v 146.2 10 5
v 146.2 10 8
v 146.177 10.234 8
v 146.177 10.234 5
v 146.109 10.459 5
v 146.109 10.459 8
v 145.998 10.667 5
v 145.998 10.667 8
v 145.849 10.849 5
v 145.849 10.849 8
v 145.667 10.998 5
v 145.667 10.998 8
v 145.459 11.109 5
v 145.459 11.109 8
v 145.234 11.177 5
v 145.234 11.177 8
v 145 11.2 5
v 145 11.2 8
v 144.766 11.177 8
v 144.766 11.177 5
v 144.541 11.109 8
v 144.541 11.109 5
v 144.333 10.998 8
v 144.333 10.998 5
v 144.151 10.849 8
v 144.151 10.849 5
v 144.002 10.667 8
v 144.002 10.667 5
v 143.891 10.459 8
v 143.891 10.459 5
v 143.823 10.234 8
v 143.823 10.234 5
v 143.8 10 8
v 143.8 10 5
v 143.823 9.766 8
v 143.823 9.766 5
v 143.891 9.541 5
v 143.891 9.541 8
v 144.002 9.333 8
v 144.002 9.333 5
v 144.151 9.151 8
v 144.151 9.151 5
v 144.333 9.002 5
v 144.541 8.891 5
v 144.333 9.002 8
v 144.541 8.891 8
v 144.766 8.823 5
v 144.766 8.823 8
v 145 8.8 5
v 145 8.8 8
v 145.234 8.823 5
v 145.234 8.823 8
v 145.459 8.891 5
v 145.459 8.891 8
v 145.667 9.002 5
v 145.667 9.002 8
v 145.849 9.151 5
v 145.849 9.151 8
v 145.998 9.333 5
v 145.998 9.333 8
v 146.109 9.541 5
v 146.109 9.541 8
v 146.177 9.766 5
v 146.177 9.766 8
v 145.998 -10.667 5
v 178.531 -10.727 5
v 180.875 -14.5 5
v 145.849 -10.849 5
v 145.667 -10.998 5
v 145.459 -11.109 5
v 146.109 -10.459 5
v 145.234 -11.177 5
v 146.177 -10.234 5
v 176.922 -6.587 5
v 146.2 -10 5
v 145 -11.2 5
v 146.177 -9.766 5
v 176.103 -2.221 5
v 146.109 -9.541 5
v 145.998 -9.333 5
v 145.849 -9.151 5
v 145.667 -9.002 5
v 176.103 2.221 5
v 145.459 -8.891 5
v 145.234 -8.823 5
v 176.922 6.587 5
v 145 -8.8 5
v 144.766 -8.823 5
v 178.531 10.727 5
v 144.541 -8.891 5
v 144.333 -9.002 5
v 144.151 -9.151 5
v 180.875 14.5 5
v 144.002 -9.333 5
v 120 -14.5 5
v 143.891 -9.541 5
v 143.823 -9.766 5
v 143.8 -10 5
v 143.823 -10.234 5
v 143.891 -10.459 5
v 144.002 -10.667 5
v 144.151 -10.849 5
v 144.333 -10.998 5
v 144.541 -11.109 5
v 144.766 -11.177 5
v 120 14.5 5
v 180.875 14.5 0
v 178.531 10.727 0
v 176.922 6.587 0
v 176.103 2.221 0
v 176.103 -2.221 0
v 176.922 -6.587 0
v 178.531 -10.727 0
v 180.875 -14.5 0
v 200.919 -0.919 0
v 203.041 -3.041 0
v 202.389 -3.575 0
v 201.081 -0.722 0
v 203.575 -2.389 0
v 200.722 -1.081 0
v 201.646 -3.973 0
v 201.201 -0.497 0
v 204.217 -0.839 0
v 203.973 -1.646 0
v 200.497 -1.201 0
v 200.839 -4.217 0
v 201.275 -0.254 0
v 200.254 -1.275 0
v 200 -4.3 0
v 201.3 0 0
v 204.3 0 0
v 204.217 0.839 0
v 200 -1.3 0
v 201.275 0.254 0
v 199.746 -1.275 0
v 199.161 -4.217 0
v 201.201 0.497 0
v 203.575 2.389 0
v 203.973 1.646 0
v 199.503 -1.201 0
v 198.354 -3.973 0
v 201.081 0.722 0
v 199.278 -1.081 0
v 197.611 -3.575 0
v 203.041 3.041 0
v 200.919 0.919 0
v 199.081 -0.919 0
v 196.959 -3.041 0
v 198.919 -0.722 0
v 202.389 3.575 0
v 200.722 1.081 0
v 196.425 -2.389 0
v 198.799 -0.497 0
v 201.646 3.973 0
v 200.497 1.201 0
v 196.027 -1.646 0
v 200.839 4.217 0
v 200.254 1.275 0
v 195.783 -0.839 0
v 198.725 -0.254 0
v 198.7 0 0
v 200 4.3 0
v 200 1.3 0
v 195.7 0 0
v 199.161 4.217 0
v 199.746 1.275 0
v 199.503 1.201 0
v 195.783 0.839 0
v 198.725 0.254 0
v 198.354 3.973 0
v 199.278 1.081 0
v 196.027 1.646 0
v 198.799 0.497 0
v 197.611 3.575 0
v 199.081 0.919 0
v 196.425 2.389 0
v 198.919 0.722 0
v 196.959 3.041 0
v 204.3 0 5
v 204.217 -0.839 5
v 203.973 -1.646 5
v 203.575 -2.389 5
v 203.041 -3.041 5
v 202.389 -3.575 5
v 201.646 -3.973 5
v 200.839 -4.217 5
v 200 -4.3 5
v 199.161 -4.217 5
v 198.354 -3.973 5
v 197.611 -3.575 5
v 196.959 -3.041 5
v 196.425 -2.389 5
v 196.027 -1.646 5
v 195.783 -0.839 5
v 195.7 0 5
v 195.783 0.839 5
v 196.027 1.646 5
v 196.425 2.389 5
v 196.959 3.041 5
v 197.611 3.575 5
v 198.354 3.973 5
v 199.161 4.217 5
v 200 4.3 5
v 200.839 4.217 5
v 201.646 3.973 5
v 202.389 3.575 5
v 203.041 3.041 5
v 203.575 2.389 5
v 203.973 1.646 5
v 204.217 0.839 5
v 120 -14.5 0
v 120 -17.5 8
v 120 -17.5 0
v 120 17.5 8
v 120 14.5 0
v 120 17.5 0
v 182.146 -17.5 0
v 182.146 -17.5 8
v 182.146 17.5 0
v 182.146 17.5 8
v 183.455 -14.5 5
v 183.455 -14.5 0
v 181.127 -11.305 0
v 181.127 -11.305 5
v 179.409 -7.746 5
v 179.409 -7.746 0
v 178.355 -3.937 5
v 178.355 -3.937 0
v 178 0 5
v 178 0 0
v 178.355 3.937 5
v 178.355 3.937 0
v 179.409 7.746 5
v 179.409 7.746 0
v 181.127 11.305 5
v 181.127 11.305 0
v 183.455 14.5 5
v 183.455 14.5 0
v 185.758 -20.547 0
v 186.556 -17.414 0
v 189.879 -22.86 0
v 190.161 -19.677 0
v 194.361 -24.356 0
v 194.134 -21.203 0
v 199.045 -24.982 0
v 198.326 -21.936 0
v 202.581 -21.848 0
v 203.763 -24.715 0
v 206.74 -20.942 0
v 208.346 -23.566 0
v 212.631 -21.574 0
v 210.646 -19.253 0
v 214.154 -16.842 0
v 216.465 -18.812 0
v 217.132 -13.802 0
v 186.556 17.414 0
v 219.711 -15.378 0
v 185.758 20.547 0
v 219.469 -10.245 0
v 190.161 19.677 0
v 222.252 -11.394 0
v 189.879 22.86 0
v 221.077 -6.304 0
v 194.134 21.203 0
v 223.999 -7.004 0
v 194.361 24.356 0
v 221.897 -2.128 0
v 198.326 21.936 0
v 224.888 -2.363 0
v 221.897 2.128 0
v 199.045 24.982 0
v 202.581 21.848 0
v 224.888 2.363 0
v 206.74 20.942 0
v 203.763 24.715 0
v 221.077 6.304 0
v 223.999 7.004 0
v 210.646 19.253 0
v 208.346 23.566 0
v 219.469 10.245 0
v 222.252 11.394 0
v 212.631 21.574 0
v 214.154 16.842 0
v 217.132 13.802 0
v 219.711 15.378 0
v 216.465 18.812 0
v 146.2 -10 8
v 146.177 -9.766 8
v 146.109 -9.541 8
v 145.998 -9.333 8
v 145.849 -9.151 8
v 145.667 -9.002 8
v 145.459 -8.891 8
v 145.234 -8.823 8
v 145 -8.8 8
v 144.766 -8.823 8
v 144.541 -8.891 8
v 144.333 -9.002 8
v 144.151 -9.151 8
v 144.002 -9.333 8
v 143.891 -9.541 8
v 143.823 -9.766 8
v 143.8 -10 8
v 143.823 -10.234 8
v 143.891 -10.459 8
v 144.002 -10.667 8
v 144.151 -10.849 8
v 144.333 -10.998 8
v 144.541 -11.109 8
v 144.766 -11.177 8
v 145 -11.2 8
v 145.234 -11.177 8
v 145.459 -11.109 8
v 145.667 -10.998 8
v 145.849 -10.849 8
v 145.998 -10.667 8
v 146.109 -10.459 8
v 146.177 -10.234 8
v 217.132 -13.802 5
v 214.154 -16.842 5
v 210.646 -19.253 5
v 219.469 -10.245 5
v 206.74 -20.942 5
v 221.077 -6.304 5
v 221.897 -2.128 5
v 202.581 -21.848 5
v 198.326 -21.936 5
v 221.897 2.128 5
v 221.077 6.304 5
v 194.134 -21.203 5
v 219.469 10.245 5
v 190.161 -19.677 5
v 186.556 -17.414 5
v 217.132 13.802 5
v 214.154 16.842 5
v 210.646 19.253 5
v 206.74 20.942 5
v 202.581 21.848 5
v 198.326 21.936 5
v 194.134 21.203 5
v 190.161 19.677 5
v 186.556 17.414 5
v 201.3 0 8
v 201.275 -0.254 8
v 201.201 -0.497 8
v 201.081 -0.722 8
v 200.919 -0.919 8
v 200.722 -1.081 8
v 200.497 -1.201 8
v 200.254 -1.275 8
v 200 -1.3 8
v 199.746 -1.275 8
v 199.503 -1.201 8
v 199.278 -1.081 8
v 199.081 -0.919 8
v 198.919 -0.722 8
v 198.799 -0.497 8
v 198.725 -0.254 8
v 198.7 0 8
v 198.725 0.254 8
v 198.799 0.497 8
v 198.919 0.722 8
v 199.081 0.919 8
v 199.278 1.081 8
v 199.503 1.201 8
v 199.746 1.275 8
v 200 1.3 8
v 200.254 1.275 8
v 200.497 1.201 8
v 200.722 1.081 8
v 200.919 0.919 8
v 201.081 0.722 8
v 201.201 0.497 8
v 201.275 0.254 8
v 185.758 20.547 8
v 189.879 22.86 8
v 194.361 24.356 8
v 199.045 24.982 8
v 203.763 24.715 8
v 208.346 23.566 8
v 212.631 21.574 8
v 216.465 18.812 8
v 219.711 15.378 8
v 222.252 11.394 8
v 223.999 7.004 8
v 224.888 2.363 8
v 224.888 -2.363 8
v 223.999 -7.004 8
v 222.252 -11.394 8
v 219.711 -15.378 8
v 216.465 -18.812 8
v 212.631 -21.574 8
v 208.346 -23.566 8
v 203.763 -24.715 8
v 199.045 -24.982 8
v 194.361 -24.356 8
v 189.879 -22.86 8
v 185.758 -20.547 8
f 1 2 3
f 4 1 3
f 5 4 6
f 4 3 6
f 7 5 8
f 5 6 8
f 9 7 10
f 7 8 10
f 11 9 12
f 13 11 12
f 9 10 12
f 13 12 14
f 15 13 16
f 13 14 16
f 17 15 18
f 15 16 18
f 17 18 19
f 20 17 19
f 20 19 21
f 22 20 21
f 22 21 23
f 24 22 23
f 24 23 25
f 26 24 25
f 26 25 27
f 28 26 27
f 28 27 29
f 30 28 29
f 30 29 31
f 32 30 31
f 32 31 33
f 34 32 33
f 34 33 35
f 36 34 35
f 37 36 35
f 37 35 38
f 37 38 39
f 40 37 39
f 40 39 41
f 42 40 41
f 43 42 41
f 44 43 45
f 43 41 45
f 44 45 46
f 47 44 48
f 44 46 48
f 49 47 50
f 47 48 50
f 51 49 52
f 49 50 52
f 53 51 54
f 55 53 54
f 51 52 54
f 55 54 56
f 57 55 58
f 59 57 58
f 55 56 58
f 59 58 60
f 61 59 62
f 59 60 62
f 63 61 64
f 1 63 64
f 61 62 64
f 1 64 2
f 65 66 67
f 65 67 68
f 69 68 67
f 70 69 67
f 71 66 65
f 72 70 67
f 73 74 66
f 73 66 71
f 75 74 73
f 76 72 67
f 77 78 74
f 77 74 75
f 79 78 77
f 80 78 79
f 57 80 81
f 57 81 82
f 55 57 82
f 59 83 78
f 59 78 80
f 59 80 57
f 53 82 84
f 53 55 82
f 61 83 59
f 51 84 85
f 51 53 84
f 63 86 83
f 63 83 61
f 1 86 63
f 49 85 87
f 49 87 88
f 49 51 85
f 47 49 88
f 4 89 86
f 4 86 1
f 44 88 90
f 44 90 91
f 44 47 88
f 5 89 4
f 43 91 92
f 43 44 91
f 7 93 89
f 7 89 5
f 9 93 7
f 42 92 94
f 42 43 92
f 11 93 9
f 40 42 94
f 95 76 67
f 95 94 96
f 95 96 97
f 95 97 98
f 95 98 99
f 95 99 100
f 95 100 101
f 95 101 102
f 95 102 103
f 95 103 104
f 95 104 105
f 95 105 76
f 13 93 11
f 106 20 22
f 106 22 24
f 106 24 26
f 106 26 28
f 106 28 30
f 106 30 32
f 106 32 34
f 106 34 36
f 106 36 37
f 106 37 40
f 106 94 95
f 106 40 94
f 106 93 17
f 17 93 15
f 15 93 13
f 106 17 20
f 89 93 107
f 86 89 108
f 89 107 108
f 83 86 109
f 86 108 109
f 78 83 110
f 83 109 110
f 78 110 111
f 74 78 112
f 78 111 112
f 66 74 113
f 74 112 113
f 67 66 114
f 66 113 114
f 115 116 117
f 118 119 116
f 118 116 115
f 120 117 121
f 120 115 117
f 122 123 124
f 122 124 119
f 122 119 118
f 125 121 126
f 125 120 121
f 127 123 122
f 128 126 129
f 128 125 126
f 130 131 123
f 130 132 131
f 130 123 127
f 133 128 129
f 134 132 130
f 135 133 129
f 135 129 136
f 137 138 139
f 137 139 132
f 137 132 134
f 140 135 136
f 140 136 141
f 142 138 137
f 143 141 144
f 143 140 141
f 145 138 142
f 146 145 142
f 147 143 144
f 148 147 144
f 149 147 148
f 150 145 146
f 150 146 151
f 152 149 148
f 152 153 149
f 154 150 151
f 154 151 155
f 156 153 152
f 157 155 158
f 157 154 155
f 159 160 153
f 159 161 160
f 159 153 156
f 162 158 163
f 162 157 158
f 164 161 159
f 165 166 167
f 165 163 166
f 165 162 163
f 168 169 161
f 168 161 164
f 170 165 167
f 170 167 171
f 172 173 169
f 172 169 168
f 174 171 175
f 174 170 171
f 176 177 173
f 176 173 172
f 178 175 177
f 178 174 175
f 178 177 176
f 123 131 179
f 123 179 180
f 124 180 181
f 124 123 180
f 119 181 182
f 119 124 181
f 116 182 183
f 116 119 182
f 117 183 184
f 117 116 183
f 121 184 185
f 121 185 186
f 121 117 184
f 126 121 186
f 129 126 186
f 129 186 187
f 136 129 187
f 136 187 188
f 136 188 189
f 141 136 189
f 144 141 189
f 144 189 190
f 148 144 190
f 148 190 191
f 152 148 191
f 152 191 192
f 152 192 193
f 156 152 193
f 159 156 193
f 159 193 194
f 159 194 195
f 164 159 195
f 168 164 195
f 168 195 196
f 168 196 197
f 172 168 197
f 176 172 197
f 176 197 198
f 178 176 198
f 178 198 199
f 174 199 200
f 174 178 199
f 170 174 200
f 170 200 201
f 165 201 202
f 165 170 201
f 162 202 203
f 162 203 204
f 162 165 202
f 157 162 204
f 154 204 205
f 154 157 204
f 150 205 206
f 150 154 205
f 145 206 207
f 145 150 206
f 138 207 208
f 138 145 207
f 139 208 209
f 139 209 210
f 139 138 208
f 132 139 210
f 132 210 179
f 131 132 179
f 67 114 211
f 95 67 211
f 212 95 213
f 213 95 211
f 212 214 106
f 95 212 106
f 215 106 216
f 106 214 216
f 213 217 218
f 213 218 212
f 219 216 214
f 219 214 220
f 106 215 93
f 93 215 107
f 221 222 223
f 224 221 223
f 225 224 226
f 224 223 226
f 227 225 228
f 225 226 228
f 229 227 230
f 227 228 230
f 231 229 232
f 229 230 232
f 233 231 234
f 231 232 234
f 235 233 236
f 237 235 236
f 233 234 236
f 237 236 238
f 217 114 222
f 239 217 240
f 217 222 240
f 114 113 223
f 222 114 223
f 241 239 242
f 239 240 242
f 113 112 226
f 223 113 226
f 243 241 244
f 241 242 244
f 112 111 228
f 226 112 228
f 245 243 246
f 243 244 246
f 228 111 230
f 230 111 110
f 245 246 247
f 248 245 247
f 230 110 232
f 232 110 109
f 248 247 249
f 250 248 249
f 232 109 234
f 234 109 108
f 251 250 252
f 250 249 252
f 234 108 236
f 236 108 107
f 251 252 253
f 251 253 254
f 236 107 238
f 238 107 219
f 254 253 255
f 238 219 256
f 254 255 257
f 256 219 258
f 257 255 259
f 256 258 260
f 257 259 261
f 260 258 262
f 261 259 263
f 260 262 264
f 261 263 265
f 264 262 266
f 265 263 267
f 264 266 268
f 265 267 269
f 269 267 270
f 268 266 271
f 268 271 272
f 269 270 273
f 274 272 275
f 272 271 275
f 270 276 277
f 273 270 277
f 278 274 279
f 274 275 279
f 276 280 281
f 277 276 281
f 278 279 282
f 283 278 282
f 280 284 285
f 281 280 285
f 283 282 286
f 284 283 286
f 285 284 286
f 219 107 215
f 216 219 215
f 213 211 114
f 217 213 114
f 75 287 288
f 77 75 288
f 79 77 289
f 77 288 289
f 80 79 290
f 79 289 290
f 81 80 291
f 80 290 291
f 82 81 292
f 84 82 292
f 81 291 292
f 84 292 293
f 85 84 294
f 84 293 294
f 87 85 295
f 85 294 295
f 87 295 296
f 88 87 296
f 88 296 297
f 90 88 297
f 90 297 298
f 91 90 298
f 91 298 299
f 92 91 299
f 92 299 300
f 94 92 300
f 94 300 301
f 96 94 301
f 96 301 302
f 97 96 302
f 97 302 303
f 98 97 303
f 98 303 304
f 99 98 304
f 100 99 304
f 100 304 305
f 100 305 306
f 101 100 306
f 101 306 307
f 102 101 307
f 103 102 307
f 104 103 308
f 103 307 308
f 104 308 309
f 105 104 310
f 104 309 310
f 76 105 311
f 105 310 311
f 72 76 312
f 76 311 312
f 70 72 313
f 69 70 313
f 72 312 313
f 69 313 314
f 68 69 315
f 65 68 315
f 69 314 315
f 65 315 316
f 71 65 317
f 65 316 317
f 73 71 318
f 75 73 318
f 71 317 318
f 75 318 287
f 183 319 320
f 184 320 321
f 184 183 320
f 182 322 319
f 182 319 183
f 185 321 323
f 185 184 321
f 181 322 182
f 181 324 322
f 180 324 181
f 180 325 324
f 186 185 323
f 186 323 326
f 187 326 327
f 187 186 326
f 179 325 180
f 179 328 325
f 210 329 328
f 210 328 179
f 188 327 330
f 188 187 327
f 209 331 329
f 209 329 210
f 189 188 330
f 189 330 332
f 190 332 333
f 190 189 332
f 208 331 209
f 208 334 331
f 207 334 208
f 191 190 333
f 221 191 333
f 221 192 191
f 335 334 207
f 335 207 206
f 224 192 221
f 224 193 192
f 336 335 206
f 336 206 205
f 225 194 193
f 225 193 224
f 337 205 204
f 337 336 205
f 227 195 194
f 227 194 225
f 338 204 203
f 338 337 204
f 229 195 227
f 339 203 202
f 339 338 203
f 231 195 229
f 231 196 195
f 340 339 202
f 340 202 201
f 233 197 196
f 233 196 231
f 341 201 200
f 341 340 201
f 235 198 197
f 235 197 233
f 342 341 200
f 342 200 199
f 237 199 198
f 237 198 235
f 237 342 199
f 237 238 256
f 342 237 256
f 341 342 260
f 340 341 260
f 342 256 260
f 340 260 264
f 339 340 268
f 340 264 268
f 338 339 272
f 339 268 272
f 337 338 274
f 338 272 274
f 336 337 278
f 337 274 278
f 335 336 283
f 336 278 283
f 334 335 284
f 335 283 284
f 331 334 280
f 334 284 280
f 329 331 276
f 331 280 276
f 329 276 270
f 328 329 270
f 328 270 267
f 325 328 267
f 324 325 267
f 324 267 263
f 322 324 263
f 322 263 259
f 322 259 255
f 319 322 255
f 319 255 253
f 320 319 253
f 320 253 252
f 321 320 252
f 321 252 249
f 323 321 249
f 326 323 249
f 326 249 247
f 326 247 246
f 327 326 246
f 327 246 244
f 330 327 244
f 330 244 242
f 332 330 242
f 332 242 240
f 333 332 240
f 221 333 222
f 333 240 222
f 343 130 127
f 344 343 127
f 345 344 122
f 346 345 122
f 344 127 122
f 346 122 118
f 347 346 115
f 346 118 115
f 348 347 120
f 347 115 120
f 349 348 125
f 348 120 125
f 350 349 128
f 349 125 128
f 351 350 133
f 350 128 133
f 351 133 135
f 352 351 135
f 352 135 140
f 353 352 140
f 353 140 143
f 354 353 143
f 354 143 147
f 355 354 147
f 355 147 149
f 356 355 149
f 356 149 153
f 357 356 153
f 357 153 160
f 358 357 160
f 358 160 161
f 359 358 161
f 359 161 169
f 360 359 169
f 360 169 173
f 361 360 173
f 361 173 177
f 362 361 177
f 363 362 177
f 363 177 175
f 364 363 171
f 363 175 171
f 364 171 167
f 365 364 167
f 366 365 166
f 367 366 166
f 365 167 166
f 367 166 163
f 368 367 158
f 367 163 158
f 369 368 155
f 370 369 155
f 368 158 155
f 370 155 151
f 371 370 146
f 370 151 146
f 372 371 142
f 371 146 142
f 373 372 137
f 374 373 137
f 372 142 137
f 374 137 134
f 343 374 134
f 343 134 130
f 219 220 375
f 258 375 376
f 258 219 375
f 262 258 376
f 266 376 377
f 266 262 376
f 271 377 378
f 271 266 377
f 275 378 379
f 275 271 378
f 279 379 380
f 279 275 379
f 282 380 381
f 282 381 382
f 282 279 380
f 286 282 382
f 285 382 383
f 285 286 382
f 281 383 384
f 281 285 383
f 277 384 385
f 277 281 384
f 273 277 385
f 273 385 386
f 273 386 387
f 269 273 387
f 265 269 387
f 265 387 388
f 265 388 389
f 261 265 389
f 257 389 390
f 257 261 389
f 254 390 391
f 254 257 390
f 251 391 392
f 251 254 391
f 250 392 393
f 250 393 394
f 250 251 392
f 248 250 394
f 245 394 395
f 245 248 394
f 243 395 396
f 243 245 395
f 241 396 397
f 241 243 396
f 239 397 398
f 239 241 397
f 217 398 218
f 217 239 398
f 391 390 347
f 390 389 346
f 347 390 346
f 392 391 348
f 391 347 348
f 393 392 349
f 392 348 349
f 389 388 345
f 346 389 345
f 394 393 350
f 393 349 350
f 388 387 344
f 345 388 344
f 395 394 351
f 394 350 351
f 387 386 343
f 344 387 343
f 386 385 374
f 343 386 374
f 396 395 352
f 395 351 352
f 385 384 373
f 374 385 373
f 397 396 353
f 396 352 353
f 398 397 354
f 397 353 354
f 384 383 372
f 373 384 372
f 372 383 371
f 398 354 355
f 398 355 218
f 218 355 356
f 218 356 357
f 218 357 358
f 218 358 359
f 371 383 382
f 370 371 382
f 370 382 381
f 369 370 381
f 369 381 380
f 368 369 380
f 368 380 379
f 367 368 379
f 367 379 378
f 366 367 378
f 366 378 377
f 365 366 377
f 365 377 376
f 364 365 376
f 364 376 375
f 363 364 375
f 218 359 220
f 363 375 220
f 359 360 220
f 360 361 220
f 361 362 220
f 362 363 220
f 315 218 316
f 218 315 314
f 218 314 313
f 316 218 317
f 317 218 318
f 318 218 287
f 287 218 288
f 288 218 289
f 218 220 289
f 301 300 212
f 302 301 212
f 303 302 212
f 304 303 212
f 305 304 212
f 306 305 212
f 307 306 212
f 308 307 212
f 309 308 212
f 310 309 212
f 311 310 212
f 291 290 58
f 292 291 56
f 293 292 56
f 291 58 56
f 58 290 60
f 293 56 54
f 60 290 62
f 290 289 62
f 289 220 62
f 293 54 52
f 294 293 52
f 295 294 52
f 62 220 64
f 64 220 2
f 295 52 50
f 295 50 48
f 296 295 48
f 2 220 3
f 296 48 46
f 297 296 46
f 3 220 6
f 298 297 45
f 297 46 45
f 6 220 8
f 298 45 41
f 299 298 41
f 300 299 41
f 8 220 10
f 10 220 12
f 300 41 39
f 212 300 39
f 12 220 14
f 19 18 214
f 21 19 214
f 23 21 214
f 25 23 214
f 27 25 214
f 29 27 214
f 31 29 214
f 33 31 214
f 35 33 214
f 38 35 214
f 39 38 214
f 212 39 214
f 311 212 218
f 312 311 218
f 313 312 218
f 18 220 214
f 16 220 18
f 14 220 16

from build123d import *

# Parameters (mm, degrees)
DODANIE_WYCI_GNI_CIE1_DEPTH = 8
OTW_R_POD_RUB_M22_D         = 2.6
SKORUPA1_T                  = -3
DODANIE_WYCI_GNI_CIE2_REACH = 228.526
OTW_R_POD_RUB_M21_D         = 2.6
WYTNIJ_WYCI_GNI_CIE1_REACH  = 228.526
SZKIC7_W                    = 41
SZKIC7_H                    = 21
OTWORY_USTALAJ_CE_8_0MM1_D  = 8
SZKIC18_W                   = 8
SZKIC18_H                   = 6
SZKIC18_W_2                 = 6
SZKIC18_H_2                 = 4
DODANIE_WYCI_GNI_CIE3_DEPTH = 10
SZYK_LINIOWY1_COUNT         = 2
SZYK_LINIOWY1_PITCH         = 50
OTW_R_POD_RUB_M24_D         = 2.4


with BuildPart() as part:
    # Szkic1 → Dodanie-wyciągnięcie1 (new body)
    with BuildSketch(Plane.XY):
        with BuildLine():
            Line((17.853571071, 17.5), (182.146428929, 17.5))
            ThreePointArc((182.146428929, 17.5), (225, 0), (182.146428929, -17.5))
            Line((182.146428929, -17.5), (17.853571071, -17.5))
            ThreePointArc((17.853571071, -17.5), (-25, 0), (17.853571071, 17.5))
        make_face()
    extrude(amount=DODANIE_WYCI_GNI_CIE1_DEPTH)

    # Otwór pod śrubę M22 (through all)
    with Locations(Plane(origin=(0, 0, 8), x_dir=(-1, 0, 0), z_dir=(0, 0, 1))):
        with Locations((-200, 0)):
            Hole(OTW_R_POD_RUB_M22_D / 2)

    # Skorupa1
    skorupa1_openings = [part.faces().sort_by_distance(p)[0] for p in [
        (99.943079522, 0, 0),
    ]]
    offset(amount=SKORUPA1_T, openings=skorupa1_openings, kind=Kind.INTERSECTION)

    # Szkic15 → Dodanie-wyciągnięcie2 (add, up to next)
    with BuildSketch(Plane(origin=(0, 0, 0), x_dir=(-1, 0, 0), z_dir=(0, 0, -1)), mode=Mode.PRIVATE) as dodanie_wyci_gni_cie2_sk1:
        with BuildLine():
            Line((-16.545392108, -14.5), (-19.124591499, -14.5))
            ThreePointArc((-19.124591499, -14.5), (-24, 0), (-19.124591499, 14.5))
            Line((-19.124591499, 14.5), (-16.545392108, 14.5))
            ThreePointArc((-16.545392108, 14.5), (-22, 0), (-16.545392108, -14.5))
        make_face()
    dodanie_wyci_gni_cie2_tool1 = extrude(dodanie_wyci_gni_cie2_sk1.sketch, amount=-DODANIE_WYCI_GNI_CIE2_REACH, mode=Mode.PRIVATE) - part.part
    # Szkic15 → Dodanie-wyciągnięcie2 (add, up to next)
    with BuildSketch(Plane(origin=(0, 0, 0), x_dir=(-1, 0, 0), z_dir=(0, 0, -1)), mode=Mode.PRIVATE) as dodanie_wyci_gni_cie2_sk2:
        with BuildLine():
            Line((-180.875408501, -14.5), (-183.454607892, -14.5))
            ThreePointArc((-183.454607892, -14.5), (-178, 0), (-183.454607892, 14.5))
            Line((-183.454607892, 14.5), (-180.875408501, 14.5))
            ThreePointArc((-180.875408501, 14.5), (-176, 0), (-180.875408501, -14.5))
        make_face()
    dodanie_wyci_gni_cie2_tool2 = extrude(dodanie_wyci_gni_cie2_sk2.sketch, amount=-DODANIE_WYCI_GNI_CIE2_REACH, mode=Mode.PRIVATE) - part.part
    add(dodanie_wyci_gni_cie2_tool1.solids().sort_by_distance((17.834992, 14.200572, 0))[0])
    add(dodanie_wyci_gni_cie2_tool2.solids().sort_by_distance((182.165008, -14.200572, 0))[0])

    # Otwór pod śrubę M21 (through all)
    with Locations(Plane.XY.offset(8)):
        with Locations((7.1, 0), (-7.1, 0)):
            Hole(OTW_R_POD_RUB_M21_D / 2)

    # Szkic7 → Wytnij-wyciągnięcie1 (cut, up to next)
    with BuildSketch(Plane(origin=(0, 0, 0), x_dir=(-1, 0, 0), z_dir=(0, 0, -1)), mode=Mode.PRIVATE) as wytnij_wyci_gni_cie1_sk1:
        with Locations((-55, 0)):
            Rectangle(SZKIC7_W, SZKIC7_H)
    wytnij_wyci_gni_cie1_tool1 = extrude(wytnij_wyci_gni_cie1_sk1.sketch, amount=-WYTNIJ_WYCI_GNI_CIE1_REACH, mode=Mode.PRIVATE) & part.part
    add(wytnij_wyci_gni_cie1_tool1.solids().sort_by_distance((55, 0, 0))[0], mode=Mode.SUBTRACT)

    # Otwory ustalające Ø8.0mm1 (through all)
    with Locations(Plane(origin=(0, 0, 8), x_dir=(-1, 0, 0), z_dir=(0, 0, 1))):
        with Locations((0, 0)):
            Hole(OTWORY_USTALAJ_CE_8_0MM1_D / 2)

    # Szkic18 → Dodanie-wyciągnięcie3 (add)
    with BuildSketch(Plane(origin=(50, 0, 0), x_dir=(0, 0, -1), z_dir=(1, 0, 0))):
        with Locations((-4, 20.5)):
            Rectangle(SZKIC18_W, SZKIC18_H)
        with Locations((-4, 20.5)):
            Rectangle(SZKIC18_W_2, SZKIC18_H_2, mode=Mode.SUBTRACT)
    dodanie_wyci_gni_cie3 = extrude(amount=DODANIE_WYCI_GNI_CIE3_DEPTH)

    # Szyk liniowy1: Dodanie-wyciągnięcie3 ×2
    with Locations(*[(i * SZYK_LINIOWY1_PITCH, 0, 0) for i in range(1, SZYK_LINIOWY1_COUNT)]):
        add(dodanie_wyci_gni_cie3)

    # Otwór pod śrubę M24 (through all)
    with Locations(Plane(origin=(0, 0, 5), x_dir=(-1, 0, 0), z_dir=(0, 0, -1))):
        with Locations((-145, -10), (-145, 10), (-95, 10), (-95, -10)):
            Hole(OTW_R_POD_RUB_M24_D / 2)

    # Cięcie powierzchnią1
    split(bisect_by=Plane(origin=(120, 0, 0), x_dir=(0, 0, -1), z_dir=(1, 0, 0)), keep=Keep.TOP)


solid = part.part
